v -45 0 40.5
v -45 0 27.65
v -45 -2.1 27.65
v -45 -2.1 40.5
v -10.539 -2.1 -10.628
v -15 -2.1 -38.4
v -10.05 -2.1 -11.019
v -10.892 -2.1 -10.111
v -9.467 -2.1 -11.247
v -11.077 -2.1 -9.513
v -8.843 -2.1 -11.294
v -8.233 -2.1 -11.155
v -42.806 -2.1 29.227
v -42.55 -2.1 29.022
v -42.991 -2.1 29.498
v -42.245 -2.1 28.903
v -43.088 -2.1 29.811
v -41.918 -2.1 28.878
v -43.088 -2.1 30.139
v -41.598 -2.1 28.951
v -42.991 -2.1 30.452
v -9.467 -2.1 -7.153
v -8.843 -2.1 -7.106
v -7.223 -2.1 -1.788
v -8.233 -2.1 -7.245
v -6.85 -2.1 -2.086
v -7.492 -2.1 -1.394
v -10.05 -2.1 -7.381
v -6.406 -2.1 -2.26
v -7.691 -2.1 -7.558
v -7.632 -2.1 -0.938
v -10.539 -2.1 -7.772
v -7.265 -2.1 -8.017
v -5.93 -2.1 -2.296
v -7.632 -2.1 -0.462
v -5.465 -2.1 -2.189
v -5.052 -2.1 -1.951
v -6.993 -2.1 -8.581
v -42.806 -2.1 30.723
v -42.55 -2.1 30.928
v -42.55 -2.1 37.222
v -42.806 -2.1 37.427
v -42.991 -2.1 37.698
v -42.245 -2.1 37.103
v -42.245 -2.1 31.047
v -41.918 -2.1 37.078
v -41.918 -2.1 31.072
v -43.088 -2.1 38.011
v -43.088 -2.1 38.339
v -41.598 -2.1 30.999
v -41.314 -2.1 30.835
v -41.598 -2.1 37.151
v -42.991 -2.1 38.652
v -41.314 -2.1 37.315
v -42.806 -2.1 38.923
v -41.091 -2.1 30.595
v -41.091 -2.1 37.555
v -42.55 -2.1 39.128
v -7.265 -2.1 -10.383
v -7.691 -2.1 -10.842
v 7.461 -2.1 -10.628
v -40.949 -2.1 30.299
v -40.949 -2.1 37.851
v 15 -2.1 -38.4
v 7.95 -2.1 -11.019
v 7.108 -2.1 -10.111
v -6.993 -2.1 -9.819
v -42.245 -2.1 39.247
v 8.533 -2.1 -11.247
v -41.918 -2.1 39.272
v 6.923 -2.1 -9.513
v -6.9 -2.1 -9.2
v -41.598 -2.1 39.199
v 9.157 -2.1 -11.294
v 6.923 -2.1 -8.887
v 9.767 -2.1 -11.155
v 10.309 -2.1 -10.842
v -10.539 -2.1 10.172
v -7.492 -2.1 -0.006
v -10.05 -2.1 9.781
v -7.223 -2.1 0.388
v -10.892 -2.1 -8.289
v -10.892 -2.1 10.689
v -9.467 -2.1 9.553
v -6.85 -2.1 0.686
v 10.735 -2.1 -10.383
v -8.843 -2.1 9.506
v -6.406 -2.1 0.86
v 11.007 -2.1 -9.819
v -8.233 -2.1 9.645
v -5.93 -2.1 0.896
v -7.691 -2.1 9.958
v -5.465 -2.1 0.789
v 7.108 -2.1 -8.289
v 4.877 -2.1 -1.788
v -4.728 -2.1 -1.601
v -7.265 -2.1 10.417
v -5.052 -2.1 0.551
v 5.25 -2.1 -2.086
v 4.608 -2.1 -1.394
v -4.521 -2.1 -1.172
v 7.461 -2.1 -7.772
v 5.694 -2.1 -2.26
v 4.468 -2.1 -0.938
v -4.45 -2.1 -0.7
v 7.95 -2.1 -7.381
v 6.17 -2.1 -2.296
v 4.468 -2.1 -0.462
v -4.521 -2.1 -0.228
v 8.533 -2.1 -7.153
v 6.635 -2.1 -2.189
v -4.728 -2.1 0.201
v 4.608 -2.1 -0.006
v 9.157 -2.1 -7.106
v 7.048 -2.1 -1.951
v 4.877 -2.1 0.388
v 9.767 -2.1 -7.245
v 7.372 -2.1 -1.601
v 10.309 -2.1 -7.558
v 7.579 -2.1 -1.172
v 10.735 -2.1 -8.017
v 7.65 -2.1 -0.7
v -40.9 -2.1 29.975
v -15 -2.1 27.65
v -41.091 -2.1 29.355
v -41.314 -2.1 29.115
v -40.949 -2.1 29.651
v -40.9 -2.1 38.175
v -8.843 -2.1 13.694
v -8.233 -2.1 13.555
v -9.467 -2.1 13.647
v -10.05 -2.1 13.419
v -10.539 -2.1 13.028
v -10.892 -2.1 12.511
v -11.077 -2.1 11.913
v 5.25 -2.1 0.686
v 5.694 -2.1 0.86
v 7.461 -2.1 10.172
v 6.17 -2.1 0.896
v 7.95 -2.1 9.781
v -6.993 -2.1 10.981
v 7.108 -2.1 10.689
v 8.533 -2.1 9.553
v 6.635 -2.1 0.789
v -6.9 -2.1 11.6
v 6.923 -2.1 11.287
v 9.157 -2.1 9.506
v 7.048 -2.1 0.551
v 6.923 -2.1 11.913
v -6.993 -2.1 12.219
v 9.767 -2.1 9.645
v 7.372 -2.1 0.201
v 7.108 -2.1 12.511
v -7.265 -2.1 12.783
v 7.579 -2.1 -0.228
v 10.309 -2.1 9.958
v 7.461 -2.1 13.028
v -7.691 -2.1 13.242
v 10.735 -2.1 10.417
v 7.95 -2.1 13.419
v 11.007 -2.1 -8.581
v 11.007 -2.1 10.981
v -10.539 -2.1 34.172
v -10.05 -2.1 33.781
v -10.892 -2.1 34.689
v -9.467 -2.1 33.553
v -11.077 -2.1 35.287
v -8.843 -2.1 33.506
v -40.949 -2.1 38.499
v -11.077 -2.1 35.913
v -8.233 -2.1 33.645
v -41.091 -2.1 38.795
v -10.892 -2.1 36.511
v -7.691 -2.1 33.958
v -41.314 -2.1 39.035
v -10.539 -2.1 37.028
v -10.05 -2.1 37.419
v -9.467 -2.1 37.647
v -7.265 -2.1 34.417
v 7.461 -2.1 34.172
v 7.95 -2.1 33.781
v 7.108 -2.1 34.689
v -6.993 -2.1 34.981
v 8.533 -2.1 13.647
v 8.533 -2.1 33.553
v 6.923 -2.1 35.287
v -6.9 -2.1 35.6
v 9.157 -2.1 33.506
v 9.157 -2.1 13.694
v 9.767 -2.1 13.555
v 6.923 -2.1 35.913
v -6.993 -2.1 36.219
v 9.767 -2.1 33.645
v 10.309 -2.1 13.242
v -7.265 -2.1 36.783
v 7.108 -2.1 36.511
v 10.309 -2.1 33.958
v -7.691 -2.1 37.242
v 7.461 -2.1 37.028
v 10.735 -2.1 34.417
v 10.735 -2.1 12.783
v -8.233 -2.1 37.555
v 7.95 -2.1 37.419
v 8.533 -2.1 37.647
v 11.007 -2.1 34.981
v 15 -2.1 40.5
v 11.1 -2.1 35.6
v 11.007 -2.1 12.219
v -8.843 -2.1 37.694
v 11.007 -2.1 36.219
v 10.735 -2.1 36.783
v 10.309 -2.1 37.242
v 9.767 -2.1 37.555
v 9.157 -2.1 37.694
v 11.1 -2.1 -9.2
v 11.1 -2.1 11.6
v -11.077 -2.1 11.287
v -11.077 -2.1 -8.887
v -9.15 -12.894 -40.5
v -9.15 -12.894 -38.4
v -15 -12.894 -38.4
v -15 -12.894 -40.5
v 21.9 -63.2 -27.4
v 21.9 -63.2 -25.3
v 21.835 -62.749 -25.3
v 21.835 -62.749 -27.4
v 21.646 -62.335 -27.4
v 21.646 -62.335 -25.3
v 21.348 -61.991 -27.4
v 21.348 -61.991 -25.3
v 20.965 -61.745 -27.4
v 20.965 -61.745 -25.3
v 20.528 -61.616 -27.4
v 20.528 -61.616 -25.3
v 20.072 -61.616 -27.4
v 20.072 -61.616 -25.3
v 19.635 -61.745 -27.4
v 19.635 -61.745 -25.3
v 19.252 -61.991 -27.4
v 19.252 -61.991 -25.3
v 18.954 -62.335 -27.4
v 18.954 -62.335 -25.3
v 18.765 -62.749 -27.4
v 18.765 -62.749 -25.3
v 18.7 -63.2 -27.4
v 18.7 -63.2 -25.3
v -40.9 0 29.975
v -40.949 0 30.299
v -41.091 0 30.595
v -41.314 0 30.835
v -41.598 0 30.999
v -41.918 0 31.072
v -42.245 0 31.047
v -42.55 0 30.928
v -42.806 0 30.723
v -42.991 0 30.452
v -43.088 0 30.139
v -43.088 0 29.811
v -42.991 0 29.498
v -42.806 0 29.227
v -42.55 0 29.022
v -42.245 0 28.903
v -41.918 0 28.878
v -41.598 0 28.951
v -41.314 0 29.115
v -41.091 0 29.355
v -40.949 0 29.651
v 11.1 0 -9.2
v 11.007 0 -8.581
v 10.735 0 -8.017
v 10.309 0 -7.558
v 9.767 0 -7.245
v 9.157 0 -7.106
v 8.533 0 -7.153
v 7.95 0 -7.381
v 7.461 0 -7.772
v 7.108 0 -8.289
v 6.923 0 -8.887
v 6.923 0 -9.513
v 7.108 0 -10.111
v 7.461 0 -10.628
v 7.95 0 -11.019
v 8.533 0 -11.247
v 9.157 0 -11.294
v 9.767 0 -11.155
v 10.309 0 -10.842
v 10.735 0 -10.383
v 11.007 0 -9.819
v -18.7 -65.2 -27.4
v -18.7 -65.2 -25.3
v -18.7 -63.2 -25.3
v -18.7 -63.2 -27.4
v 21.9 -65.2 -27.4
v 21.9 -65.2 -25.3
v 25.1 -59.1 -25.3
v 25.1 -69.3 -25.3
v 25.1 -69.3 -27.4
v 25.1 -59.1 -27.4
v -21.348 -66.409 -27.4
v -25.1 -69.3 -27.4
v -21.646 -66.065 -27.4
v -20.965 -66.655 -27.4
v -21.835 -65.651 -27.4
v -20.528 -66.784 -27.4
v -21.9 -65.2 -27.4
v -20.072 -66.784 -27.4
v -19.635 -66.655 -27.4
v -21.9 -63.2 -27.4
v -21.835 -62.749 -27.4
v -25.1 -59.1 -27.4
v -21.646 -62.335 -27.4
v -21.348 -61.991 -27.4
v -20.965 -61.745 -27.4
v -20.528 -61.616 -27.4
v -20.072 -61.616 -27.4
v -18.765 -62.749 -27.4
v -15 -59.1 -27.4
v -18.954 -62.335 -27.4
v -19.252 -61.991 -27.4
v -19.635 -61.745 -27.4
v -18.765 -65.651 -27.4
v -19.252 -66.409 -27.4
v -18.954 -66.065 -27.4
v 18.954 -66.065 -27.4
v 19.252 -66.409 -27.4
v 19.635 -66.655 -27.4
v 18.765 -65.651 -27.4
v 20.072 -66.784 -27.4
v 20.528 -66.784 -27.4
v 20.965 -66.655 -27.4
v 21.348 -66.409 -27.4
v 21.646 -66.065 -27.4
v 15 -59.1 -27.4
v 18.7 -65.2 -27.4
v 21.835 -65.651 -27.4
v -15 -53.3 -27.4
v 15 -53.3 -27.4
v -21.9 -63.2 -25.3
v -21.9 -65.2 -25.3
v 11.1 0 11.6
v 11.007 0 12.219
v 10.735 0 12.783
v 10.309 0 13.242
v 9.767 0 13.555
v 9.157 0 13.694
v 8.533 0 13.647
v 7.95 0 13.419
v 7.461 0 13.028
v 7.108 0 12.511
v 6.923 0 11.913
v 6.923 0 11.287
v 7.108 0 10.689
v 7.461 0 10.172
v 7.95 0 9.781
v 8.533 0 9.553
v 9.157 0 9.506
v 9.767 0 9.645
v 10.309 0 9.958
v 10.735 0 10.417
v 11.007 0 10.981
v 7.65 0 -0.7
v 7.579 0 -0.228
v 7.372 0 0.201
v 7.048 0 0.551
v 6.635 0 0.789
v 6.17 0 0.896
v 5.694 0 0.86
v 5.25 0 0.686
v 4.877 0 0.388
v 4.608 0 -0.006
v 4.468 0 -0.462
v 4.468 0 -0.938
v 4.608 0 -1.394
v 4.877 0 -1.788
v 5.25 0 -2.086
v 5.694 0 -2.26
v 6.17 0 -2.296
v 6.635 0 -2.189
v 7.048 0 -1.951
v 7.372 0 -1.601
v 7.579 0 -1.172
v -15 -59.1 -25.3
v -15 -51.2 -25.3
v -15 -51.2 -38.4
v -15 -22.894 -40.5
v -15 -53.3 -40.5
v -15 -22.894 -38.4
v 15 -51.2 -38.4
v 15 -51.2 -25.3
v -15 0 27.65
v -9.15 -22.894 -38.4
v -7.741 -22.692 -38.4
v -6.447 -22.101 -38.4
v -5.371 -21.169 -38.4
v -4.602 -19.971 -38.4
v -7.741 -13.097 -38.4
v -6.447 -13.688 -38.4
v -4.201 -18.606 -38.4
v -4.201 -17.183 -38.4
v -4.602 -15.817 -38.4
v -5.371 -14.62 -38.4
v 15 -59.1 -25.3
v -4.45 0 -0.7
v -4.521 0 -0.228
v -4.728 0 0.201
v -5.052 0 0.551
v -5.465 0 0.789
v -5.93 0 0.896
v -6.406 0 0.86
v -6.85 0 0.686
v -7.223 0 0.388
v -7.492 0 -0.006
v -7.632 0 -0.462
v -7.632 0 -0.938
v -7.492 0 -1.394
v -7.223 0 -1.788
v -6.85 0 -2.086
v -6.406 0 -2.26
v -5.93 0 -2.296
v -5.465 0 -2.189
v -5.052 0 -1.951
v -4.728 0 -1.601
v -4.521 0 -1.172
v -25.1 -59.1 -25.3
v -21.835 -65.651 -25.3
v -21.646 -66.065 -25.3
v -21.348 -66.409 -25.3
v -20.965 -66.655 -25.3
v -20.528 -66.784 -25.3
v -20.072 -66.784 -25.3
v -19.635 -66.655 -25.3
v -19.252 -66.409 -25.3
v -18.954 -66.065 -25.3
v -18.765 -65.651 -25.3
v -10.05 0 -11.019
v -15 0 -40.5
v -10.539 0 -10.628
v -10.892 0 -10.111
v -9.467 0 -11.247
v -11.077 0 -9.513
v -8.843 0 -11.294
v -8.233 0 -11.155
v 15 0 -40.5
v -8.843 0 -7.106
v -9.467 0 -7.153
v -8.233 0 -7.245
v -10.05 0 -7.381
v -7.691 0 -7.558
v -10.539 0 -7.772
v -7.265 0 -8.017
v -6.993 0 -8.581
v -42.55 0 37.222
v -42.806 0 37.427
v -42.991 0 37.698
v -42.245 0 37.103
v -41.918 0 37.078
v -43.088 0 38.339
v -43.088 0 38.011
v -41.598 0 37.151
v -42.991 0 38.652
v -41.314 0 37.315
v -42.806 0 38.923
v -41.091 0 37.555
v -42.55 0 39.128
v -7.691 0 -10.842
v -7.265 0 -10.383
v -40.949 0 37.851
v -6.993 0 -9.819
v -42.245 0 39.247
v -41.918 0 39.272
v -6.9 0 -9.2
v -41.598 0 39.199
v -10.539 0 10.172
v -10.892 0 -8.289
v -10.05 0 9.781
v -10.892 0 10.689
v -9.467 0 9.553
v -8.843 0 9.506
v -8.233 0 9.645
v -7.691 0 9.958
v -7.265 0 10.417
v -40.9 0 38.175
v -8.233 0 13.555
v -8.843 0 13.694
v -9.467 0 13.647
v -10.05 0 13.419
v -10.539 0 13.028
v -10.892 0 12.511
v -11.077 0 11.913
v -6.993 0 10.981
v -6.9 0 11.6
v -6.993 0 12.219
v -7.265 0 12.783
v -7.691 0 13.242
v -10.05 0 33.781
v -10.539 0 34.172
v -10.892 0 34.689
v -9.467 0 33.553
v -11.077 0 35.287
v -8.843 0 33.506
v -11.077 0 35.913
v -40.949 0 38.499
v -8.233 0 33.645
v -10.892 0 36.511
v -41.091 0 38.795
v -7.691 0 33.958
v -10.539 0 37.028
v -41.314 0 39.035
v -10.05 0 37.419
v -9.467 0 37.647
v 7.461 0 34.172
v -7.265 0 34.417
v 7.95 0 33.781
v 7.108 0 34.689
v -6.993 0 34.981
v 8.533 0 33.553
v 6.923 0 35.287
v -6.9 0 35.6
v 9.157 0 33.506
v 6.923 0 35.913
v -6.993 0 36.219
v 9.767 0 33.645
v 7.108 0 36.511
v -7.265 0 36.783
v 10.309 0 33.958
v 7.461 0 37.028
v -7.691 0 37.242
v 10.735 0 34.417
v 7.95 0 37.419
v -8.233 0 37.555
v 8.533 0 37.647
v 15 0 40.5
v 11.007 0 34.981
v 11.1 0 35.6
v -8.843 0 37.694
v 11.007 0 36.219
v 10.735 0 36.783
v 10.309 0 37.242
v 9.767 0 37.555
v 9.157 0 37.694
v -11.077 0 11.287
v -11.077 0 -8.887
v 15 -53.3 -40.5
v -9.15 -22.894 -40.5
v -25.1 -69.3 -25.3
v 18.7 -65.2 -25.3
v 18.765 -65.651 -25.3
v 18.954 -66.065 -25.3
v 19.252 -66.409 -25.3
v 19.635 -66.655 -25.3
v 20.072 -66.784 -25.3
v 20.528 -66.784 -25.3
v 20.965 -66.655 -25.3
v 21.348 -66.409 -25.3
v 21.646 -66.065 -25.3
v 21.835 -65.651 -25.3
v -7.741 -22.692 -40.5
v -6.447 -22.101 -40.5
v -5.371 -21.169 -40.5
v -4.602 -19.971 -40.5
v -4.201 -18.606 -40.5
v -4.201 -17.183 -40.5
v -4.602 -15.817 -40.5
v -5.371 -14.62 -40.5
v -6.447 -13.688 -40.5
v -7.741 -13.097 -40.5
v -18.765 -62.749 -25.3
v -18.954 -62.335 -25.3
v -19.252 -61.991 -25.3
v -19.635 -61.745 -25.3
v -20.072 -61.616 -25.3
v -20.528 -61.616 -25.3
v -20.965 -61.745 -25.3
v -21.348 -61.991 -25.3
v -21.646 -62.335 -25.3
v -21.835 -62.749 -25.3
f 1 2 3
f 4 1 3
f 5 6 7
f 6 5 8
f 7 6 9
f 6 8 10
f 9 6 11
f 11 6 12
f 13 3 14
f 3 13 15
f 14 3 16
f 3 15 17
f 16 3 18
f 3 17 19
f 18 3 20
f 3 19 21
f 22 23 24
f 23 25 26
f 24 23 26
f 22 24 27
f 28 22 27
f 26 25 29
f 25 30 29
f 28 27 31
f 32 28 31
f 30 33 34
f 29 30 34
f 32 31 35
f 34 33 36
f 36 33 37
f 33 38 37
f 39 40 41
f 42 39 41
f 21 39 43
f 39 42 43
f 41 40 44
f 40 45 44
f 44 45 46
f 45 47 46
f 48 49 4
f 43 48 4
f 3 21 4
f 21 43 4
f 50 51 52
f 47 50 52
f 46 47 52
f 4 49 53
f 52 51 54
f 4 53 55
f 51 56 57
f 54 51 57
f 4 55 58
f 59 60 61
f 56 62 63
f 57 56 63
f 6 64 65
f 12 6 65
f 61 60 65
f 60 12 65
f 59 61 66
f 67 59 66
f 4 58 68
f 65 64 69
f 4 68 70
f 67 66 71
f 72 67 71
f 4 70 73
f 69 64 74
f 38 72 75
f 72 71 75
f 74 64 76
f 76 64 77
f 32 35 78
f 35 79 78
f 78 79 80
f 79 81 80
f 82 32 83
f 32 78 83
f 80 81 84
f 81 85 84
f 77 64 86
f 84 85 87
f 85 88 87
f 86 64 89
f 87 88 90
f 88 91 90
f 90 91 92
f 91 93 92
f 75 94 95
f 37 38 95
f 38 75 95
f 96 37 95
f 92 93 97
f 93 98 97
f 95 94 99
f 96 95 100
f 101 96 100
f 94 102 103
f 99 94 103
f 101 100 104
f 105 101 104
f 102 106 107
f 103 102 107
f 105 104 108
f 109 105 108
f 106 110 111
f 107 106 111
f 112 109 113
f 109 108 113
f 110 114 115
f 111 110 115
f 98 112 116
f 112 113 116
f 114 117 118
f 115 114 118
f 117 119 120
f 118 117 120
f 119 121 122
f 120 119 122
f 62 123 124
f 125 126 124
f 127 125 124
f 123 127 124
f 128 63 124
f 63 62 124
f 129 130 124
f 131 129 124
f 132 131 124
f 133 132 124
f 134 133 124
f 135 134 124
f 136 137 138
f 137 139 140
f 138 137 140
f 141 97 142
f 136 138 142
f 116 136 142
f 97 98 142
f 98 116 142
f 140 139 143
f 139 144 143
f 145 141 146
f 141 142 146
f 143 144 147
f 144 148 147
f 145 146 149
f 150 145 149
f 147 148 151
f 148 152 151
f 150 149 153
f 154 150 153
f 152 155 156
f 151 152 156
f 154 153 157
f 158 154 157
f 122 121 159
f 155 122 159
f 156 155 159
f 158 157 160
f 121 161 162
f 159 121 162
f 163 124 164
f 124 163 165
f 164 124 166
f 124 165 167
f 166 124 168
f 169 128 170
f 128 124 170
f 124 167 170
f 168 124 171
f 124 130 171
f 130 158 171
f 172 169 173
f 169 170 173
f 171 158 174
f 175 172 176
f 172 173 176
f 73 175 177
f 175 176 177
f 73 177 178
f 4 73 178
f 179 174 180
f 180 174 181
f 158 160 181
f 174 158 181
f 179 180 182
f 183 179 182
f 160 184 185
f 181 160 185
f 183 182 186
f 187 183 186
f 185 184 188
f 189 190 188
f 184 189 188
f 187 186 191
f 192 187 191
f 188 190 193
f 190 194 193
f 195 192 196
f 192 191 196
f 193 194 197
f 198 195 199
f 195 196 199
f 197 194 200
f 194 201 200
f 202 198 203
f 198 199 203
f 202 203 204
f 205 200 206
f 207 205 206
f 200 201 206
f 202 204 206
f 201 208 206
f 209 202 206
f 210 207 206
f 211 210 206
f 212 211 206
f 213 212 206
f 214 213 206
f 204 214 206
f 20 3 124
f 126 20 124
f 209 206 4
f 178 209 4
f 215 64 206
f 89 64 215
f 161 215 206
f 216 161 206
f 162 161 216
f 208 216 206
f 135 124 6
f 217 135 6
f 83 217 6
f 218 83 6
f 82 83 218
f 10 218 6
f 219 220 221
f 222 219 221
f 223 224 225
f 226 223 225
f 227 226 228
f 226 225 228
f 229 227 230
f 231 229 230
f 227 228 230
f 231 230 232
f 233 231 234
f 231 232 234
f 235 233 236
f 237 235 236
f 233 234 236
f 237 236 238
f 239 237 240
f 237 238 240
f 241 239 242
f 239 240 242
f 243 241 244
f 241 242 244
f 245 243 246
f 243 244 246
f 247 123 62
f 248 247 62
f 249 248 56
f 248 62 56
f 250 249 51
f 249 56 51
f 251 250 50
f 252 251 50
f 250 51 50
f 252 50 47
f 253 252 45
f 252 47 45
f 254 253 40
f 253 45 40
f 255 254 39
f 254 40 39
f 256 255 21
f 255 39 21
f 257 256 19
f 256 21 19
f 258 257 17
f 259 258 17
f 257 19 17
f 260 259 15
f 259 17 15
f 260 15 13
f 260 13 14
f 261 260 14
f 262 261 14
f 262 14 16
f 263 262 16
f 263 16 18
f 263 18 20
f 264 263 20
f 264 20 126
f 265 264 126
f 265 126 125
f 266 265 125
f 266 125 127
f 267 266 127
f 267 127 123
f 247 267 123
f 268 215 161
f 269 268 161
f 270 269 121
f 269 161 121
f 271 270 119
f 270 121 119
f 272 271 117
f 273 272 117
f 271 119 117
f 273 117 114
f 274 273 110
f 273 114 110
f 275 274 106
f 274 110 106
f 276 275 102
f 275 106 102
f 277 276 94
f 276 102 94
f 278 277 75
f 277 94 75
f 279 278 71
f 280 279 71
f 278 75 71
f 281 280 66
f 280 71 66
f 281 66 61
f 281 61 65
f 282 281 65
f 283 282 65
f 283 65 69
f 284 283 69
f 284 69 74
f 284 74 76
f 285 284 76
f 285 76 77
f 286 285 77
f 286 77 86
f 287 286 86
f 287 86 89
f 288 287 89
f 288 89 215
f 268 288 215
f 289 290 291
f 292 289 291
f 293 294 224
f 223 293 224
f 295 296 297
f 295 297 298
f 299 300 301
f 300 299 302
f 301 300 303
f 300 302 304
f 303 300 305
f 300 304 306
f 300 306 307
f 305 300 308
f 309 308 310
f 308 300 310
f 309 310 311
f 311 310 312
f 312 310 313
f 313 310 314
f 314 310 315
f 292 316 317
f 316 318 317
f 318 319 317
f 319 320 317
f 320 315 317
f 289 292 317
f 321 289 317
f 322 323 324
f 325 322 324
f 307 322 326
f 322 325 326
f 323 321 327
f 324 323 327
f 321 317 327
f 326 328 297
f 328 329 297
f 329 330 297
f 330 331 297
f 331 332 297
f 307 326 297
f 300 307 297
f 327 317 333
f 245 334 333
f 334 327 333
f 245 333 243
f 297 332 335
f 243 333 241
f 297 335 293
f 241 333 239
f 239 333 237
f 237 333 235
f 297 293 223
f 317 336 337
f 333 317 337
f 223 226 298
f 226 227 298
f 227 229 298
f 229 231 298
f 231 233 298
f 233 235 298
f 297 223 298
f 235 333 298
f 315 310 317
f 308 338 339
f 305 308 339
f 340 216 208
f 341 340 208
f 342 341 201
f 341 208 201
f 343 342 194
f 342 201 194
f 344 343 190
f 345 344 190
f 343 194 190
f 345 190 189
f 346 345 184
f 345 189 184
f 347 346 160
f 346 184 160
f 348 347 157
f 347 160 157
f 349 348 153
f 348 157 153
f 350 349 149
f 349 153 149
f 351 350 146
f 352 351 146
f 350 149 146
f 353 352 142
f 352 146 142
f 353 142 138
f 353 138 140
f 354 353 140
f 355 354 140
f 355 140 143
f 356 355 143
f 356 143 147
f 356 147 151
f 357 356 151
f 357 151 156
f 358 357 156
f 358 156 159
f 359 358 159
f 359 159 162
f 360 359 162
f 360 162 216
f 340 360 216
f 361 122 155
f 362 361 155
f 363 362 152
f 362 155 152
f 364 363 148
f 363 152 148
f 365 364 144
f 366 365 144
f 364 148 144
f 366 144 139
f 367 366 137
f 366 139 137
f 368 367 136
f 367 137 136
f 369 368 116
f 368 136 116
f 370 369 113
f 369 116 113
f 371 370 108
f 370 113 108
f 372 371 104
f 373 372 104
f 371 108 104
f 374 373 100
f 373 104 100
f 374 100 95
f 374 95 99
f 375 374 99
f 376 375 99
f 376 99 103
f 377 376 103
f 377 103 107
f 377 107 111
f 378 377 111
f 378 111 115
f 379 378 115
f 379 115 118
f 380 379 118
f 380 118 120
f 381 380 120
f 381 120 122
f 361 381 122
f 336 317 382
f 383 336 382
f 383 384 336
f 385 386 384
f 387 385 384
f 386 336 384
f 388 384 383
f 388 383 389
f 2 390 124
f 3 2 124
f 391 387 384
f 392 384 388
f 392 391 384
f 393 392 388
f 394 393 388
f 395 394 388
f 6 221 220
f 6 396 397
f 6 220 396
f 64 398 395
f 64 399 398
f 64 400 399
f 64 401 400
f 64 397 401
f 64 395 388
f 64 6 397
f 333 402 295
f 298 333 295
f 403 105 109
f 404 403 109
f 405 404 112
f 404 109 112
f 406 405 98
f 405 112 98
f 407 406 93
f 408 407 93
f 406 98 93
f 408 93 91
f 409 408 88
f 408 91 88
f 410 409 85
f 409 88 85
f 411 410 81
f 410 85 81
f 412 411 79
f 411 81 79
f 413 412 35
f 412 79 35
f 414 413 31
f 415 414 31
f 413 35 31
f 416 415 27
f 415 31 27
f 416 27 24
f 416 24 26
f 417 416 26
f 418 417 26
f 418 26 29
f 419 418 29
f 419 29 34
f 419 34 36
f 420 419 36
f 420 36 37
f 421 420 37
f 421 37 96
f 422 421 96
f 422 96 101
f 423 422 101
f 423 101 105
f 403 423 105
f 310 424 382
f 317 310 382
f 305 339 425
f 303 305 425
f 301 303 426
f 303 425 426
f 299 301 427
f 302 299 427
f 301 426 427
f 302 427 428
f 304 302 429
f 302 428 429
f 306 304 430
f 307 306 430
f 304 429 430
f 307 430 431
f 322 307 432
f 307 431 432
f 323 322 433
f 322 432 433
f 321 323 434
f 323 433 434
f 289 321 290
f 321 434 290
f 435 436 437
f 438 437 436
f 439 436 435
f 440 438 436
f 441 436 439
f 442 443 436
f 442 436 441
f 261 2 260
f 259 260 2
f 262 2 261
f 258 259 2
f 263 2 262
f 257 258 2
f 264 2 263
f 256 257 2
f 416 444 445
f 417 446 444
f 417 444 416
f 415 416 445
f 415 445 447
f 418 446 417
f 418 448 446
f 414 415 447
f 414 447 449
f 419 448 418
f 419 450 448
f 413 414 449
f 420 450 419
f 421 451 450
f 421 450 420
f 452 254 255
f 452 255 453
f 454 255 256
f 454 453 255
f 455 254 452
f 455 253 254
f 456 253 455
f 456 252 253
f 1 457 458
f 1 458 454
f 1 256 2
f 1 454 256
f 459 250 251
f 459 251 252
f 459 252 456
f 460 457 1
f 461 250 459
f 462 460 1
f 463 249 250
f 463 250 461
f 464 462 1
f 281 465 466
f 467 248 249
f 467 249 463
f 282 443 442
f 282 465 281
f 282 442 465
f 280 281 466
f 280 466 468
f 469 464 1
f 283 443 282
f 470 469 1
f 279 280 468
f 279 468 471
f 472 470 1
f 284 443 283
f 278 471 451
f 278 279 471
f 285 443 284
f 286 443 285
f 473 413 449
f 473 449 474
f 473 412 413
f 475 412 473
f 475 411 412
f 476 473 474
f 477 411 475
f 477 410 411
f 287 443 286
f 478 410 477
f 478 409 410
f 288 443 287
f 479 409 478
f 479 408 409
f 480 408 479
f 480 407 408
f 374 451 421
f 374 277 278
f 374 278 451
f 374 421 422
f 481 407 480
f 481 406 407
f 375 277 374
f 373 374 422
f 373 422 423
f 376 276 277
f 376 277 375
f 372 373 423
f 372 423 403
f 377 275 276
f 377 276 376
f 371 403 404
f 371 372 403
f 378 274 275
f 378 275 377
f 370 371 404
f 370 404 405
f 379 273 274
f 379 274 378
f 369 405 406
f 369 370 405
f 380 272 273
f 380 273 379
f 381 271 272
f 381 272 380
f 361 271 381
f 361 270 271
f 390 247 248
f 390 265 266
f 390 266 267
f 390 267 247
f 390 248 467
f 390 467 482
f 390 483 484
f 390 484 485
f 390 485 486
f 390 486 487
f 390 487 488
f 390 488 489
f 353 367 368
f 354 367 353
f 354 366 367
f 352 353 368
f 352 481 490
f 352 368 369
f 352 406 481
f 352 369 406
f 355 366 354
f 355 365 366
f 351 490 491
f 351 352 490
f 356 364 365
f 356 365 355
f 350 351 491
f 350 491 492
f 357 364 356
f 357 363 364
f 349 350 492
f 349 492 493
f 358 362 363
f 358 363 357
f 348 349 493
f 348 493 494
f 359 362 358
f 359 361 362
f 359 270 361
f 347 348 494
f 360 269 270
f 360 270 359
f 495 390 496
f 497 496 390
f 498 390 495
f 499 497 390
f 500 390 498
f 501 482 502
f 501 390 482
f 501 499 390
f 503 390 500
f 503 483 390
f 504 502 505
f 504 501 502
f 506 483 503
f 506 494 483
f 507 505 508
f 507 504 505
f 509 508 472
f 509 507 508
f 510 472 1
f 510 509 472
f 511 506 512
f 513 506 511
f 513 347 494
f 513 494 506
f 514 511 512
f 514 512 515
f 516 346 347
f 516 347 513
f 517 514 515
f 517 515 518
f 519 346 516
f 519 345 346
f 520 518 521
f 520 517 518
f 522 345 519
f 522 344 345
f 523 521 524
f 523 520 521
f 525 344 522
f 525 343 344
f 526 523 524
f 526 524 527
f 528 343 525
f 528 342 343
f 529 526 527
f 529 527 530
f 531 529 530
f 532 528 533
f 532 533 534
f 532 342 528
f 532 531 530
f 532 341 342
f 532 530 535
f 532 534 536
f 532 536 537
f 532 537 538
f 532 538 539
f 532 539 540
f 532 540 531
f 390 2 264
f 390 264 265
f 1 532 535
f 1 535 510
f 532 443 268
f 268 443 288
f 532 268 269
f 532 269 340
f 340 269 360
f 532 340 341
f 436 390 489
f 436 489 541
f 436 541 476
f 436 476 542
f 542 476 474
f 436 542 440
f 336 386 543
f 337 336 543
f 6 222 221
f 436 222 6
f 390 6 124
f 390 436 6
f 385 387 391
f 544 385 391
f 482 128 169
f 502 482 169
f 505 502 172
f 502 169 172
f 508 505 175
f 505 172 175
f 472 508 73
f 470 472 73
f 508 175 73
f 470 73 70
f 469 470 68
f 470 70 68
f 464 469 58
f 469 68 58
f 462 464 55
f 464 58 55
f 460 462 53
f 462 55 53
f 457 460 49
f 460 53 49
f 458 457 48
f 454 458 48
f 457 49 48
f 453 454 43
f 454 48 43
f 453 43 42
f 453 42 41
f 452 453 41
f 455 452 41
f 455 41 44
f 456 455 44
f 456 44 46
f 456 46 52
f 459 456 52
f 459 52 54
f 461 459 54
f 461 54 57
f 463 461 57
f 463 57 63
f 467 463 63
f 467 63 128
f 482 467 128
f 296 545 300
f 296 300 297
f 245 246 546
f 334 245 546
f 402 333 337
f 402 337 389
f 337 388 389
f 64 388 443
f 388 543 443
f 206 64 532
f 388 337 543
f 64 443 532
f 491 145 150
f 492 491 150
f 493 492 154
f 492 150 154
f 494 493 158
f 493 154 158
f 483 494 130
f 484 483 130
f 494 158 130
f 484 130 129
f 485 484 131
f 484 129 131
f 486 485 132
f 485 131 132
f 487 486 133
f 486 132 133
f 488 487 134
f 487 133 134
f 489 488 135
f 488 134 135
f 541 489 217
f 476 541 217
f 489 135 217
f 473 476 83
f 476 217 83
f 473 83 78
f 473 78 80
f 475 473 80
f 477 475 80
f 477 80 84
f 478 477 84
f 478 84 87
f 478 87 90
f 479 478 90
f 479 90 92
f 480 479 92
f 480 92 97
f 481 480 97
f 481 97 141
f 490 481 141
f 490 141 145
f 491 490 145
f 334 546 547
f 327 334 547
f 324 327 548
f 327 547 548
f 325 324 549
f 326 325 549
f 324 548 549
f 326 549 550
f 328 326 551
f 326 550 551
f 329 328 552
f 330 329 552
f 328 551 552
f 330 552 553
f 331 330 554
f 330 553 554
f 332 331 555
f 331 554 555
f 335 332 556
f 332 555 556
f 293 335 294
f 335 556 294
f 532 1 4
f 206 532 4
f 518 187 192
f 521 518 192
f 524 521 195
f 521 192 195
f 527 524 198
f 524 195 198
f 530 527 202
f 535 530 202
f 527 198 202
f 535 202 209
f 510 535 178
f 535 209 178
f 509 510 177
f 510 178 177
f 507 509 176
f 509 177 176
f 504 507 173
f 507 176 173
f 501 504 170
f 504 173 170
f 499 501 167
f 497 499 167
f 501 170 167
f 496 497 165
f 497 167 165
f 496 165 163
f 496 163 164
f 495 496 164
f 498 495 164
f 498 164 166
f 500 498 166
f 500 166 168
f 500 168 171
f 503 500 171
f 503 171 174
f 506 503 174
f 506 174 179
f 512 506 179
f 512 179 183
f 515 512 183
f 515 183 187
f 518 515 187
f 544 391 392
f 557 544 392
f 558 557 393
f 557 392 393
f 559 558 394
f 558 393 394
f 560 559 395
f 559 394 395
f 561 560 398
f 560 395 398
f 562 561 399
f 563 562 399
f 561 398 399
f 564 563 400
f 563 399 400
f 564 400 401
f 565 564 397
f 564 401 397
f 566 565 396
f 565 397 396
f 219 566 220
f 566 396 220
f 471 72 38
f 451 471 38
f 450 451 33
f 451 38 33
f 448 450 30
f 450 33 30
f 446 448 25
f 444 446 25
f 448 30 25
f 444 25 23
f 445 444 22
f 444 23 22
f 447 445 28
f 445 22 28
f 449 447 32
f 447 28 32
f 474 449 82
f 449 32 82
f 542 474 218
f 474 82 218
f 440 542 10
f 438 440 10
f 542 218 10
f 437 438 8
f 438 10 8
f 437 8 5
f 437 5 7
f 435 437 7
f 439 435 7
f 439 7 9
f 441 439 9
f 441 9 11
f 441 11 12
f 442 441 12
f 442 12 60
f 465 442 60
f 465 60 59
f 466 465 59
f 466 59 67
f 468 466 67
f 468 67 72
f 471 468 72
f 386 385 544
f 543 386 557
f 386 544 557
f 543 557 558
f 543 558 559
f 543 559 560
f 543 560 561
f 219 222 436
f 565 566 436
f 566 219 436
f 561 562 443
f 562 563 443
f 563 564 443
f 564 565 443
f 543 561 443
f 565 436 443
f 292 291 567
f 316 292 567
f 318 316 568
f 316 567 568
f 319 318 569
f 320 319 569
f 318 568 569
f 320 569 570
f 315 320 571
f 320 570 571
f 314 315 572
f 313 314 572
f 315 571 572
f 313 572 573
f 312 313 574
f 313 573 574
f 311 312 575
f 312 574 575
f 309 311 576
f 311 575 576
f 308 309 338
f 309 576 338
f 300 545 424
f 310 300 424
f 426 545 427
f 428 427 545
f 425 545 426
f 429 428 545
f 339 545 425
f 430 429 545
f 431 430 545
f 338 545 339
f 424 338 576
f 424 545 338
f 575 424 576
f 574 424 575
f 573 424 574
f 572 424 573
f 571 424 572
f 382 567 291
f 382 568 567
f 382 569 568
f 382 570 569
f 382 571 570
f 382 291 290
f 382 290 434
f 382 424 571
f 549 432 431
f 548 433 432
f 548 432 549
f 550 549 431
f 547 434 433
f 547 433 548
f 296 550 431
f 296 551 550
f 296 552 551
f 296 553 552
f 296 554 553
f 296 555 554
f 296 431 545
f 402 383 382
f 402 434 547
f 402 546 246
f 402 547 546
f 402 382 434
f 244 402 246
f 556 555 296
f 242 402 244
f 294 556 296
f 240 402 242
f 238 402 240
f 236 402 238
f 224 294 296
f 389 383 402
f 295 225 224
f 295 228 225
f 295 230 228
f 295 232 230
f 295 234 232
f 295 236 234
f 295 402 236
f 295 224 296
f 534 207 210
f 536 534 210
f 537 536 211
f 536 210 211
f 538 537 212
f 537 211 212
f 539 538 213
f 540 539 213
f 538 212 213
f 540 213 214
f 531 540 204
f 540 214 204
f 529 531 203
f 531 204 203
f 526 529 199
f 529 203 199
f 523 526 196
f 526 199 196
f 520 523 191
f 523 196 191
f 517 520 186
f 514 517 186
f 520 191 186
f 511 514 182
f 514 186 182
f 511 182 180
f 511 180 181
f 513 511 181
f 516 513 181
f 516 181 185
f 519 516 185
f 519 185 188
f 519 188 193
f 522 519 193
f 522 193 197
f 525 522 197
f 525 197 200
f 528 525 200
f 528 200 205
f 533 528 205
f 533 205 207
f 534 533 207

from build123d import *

# Parameters (mm, degrees)
F0_W      = 30
F0_H      = 81
F1_DEPTH  = 2.1
F2_W      = 30
F2_H      = 2.1
F3_DEPTH  = 51.2
F4_W      = 30
F4_H      = 2.1
F5_DEPTH  = 13.1
F6_W      = 30
F6_H      = 2.1
F7_DEPTH  = 16
F8_W      = 10.1
F8_H      = 10.2
F9_DEPTH  = 2.1
F11_DEPTH = 15.201
F13_DEPTH = 2.101
F14_R     = 2.1
F14_R_2   = 1.6
F15_DEPTH = 2.101
F16_W     = 2.1
F16_H     = 12.85
F17_DEPTH = 30
F18_R     = 1.1
F19_DEPTH = 25


with BuildPart() as f1:
    # F0 (on Front) → F1 (new body)
    with BuildSketch(Plane.XZ):
        Rectangle(F0_W, F0_H)
    extrude(amount=F1_DEPTH)

    # F2 (on face) → F3 (join)
    with BuildSketch(Plane.XZ.offset(2.1)):
        with Locations((0, -39.45)):
            Rectangle(F2_W, F2_H)
    extrude(amount=F3_DEPTH)

    # F4 (on face) → F5 (join)
    with BuildSketch(Plane.XY.offset(-38.4)):
        with Locations((0, -52.25)):
            Rectangle(F4_W, F4_H)
    extrude(amount=F5_DEPTH)

    # F6 (on face) → F7 (join)
    with BuildSketch(Plane.XZ.offset(53.3)):
        with Locations((0, -26.35)):
            Rectangle(F6_W, F6_H)
    extrude(amount=F7_DEPTH)

    # F8 (on face) → F9 (join)
    with BuildSketch(Plane.XY.offset(-25.3)):
        with Locations((-20.05, -64.2)):
            Rectangle(F8_W, F8_H)
        with Locations((20.05, -64.2)):
            Rectangle(F8_W, F8_H)
    extrude(amount=-F9_DEPTH)

    # F10 (on face) → F11 (cut, through all)
    with BuildSketch(Plane.XY.offset(-25.3)):
        with BuildLine():
            Line((-21.9, -63.2), (-21.9, -65.2))
            ThreePointArc((-21.9, -65.2), (-20.3, -66.8), (-18.7, -65.2))
            Line((-18.7, -65.2), (-18.7, -63.2))
            ThreePointArc((-18.7, -63.2), (-20.3, -61.6), (-21.9, -63.2))
        make_face()
        with BuildLine():
            Line((18.7, -63.2), (18.7, -65.2))
            ThreePointArc((18.7, -65.2), (20.3, -66.8), (21.9, -65.2))
            Line((21.9, -65.2), (21.9, -63.2))
            ThreePointArc((21.9, -63.2), (20.3, -61.6), (18.7, -63.2))
        make_face()
    extrude(amount=-F11_DEPTH, mode=Mode.SUBTRACT)

    # F12 (on face) → F13 (cut, through all)
    with BuildSketch(Plane.XY.offset(-38.4)):
        with BuildLine():
            Line((-15, -22.894339), (-9.15, -22.894339))
            ThreePointArc((-9.15, -22.894339), (-4.15, -17.894339), (-9.15, -12.894339))
            Line((-9.15, -12.894339), (-15, -12.894339))
            Line((-15, -12.894339), (-15, -22.894339))
        make_face()
    extrude(amount=-F13_DEPTH, mode=Mode.SUBTRACT)

    # F14 (on face) → F15 (cut, through all)
    with BuildSketch(Plane.XZ.offset(2.1)):
        with Locations((9, 35.6)):
            Circle(F14_R)
        with Locations((9, 11.6)):
            Circle(F14_R)
        with Locations((-9, 35.6)):
            Circle(F14_R)
        with Locations((-9, 11.6)):
            Circle(F14_R)
        with Locations((9, -9.2)):
            Circle(F14_R)
        with Locations((-9, -9.2)):
            Circle(F14_R)
        with Locations((6.05, -0.7)):
            Circle(F14_R_2)
        with Locations((-6.05, -0.7)):
            Circle(F14_R_2)
    extrude(amount=-F15_DEPTH, mode=Mode.SUBTRACT)

    # F16 (on face) → F17 (join)
    with BuildSketch(Plane(origin=(-15, 0, 0), x_dir=(0, -1, 0), z_dir=(-1, 0, 0))):
        with Locations((1.05, 34.075)):
            Rectangle(F16_W, F16_H)
    extrude(amount=F17_DEPTH)

    # F18 (on face) → F19 (cut)
    with BuildSketch(Plane.XZ.offset(2.1)):
        with Locations((-42, 38.175)):
            Circle(F18_R)
        with Locations((-42, 29.975)):
            Circle(F18_R)
    extrude(amount=-F19_DEPTH, mode=Mode.SUBTRACT)


solid = f1.part
